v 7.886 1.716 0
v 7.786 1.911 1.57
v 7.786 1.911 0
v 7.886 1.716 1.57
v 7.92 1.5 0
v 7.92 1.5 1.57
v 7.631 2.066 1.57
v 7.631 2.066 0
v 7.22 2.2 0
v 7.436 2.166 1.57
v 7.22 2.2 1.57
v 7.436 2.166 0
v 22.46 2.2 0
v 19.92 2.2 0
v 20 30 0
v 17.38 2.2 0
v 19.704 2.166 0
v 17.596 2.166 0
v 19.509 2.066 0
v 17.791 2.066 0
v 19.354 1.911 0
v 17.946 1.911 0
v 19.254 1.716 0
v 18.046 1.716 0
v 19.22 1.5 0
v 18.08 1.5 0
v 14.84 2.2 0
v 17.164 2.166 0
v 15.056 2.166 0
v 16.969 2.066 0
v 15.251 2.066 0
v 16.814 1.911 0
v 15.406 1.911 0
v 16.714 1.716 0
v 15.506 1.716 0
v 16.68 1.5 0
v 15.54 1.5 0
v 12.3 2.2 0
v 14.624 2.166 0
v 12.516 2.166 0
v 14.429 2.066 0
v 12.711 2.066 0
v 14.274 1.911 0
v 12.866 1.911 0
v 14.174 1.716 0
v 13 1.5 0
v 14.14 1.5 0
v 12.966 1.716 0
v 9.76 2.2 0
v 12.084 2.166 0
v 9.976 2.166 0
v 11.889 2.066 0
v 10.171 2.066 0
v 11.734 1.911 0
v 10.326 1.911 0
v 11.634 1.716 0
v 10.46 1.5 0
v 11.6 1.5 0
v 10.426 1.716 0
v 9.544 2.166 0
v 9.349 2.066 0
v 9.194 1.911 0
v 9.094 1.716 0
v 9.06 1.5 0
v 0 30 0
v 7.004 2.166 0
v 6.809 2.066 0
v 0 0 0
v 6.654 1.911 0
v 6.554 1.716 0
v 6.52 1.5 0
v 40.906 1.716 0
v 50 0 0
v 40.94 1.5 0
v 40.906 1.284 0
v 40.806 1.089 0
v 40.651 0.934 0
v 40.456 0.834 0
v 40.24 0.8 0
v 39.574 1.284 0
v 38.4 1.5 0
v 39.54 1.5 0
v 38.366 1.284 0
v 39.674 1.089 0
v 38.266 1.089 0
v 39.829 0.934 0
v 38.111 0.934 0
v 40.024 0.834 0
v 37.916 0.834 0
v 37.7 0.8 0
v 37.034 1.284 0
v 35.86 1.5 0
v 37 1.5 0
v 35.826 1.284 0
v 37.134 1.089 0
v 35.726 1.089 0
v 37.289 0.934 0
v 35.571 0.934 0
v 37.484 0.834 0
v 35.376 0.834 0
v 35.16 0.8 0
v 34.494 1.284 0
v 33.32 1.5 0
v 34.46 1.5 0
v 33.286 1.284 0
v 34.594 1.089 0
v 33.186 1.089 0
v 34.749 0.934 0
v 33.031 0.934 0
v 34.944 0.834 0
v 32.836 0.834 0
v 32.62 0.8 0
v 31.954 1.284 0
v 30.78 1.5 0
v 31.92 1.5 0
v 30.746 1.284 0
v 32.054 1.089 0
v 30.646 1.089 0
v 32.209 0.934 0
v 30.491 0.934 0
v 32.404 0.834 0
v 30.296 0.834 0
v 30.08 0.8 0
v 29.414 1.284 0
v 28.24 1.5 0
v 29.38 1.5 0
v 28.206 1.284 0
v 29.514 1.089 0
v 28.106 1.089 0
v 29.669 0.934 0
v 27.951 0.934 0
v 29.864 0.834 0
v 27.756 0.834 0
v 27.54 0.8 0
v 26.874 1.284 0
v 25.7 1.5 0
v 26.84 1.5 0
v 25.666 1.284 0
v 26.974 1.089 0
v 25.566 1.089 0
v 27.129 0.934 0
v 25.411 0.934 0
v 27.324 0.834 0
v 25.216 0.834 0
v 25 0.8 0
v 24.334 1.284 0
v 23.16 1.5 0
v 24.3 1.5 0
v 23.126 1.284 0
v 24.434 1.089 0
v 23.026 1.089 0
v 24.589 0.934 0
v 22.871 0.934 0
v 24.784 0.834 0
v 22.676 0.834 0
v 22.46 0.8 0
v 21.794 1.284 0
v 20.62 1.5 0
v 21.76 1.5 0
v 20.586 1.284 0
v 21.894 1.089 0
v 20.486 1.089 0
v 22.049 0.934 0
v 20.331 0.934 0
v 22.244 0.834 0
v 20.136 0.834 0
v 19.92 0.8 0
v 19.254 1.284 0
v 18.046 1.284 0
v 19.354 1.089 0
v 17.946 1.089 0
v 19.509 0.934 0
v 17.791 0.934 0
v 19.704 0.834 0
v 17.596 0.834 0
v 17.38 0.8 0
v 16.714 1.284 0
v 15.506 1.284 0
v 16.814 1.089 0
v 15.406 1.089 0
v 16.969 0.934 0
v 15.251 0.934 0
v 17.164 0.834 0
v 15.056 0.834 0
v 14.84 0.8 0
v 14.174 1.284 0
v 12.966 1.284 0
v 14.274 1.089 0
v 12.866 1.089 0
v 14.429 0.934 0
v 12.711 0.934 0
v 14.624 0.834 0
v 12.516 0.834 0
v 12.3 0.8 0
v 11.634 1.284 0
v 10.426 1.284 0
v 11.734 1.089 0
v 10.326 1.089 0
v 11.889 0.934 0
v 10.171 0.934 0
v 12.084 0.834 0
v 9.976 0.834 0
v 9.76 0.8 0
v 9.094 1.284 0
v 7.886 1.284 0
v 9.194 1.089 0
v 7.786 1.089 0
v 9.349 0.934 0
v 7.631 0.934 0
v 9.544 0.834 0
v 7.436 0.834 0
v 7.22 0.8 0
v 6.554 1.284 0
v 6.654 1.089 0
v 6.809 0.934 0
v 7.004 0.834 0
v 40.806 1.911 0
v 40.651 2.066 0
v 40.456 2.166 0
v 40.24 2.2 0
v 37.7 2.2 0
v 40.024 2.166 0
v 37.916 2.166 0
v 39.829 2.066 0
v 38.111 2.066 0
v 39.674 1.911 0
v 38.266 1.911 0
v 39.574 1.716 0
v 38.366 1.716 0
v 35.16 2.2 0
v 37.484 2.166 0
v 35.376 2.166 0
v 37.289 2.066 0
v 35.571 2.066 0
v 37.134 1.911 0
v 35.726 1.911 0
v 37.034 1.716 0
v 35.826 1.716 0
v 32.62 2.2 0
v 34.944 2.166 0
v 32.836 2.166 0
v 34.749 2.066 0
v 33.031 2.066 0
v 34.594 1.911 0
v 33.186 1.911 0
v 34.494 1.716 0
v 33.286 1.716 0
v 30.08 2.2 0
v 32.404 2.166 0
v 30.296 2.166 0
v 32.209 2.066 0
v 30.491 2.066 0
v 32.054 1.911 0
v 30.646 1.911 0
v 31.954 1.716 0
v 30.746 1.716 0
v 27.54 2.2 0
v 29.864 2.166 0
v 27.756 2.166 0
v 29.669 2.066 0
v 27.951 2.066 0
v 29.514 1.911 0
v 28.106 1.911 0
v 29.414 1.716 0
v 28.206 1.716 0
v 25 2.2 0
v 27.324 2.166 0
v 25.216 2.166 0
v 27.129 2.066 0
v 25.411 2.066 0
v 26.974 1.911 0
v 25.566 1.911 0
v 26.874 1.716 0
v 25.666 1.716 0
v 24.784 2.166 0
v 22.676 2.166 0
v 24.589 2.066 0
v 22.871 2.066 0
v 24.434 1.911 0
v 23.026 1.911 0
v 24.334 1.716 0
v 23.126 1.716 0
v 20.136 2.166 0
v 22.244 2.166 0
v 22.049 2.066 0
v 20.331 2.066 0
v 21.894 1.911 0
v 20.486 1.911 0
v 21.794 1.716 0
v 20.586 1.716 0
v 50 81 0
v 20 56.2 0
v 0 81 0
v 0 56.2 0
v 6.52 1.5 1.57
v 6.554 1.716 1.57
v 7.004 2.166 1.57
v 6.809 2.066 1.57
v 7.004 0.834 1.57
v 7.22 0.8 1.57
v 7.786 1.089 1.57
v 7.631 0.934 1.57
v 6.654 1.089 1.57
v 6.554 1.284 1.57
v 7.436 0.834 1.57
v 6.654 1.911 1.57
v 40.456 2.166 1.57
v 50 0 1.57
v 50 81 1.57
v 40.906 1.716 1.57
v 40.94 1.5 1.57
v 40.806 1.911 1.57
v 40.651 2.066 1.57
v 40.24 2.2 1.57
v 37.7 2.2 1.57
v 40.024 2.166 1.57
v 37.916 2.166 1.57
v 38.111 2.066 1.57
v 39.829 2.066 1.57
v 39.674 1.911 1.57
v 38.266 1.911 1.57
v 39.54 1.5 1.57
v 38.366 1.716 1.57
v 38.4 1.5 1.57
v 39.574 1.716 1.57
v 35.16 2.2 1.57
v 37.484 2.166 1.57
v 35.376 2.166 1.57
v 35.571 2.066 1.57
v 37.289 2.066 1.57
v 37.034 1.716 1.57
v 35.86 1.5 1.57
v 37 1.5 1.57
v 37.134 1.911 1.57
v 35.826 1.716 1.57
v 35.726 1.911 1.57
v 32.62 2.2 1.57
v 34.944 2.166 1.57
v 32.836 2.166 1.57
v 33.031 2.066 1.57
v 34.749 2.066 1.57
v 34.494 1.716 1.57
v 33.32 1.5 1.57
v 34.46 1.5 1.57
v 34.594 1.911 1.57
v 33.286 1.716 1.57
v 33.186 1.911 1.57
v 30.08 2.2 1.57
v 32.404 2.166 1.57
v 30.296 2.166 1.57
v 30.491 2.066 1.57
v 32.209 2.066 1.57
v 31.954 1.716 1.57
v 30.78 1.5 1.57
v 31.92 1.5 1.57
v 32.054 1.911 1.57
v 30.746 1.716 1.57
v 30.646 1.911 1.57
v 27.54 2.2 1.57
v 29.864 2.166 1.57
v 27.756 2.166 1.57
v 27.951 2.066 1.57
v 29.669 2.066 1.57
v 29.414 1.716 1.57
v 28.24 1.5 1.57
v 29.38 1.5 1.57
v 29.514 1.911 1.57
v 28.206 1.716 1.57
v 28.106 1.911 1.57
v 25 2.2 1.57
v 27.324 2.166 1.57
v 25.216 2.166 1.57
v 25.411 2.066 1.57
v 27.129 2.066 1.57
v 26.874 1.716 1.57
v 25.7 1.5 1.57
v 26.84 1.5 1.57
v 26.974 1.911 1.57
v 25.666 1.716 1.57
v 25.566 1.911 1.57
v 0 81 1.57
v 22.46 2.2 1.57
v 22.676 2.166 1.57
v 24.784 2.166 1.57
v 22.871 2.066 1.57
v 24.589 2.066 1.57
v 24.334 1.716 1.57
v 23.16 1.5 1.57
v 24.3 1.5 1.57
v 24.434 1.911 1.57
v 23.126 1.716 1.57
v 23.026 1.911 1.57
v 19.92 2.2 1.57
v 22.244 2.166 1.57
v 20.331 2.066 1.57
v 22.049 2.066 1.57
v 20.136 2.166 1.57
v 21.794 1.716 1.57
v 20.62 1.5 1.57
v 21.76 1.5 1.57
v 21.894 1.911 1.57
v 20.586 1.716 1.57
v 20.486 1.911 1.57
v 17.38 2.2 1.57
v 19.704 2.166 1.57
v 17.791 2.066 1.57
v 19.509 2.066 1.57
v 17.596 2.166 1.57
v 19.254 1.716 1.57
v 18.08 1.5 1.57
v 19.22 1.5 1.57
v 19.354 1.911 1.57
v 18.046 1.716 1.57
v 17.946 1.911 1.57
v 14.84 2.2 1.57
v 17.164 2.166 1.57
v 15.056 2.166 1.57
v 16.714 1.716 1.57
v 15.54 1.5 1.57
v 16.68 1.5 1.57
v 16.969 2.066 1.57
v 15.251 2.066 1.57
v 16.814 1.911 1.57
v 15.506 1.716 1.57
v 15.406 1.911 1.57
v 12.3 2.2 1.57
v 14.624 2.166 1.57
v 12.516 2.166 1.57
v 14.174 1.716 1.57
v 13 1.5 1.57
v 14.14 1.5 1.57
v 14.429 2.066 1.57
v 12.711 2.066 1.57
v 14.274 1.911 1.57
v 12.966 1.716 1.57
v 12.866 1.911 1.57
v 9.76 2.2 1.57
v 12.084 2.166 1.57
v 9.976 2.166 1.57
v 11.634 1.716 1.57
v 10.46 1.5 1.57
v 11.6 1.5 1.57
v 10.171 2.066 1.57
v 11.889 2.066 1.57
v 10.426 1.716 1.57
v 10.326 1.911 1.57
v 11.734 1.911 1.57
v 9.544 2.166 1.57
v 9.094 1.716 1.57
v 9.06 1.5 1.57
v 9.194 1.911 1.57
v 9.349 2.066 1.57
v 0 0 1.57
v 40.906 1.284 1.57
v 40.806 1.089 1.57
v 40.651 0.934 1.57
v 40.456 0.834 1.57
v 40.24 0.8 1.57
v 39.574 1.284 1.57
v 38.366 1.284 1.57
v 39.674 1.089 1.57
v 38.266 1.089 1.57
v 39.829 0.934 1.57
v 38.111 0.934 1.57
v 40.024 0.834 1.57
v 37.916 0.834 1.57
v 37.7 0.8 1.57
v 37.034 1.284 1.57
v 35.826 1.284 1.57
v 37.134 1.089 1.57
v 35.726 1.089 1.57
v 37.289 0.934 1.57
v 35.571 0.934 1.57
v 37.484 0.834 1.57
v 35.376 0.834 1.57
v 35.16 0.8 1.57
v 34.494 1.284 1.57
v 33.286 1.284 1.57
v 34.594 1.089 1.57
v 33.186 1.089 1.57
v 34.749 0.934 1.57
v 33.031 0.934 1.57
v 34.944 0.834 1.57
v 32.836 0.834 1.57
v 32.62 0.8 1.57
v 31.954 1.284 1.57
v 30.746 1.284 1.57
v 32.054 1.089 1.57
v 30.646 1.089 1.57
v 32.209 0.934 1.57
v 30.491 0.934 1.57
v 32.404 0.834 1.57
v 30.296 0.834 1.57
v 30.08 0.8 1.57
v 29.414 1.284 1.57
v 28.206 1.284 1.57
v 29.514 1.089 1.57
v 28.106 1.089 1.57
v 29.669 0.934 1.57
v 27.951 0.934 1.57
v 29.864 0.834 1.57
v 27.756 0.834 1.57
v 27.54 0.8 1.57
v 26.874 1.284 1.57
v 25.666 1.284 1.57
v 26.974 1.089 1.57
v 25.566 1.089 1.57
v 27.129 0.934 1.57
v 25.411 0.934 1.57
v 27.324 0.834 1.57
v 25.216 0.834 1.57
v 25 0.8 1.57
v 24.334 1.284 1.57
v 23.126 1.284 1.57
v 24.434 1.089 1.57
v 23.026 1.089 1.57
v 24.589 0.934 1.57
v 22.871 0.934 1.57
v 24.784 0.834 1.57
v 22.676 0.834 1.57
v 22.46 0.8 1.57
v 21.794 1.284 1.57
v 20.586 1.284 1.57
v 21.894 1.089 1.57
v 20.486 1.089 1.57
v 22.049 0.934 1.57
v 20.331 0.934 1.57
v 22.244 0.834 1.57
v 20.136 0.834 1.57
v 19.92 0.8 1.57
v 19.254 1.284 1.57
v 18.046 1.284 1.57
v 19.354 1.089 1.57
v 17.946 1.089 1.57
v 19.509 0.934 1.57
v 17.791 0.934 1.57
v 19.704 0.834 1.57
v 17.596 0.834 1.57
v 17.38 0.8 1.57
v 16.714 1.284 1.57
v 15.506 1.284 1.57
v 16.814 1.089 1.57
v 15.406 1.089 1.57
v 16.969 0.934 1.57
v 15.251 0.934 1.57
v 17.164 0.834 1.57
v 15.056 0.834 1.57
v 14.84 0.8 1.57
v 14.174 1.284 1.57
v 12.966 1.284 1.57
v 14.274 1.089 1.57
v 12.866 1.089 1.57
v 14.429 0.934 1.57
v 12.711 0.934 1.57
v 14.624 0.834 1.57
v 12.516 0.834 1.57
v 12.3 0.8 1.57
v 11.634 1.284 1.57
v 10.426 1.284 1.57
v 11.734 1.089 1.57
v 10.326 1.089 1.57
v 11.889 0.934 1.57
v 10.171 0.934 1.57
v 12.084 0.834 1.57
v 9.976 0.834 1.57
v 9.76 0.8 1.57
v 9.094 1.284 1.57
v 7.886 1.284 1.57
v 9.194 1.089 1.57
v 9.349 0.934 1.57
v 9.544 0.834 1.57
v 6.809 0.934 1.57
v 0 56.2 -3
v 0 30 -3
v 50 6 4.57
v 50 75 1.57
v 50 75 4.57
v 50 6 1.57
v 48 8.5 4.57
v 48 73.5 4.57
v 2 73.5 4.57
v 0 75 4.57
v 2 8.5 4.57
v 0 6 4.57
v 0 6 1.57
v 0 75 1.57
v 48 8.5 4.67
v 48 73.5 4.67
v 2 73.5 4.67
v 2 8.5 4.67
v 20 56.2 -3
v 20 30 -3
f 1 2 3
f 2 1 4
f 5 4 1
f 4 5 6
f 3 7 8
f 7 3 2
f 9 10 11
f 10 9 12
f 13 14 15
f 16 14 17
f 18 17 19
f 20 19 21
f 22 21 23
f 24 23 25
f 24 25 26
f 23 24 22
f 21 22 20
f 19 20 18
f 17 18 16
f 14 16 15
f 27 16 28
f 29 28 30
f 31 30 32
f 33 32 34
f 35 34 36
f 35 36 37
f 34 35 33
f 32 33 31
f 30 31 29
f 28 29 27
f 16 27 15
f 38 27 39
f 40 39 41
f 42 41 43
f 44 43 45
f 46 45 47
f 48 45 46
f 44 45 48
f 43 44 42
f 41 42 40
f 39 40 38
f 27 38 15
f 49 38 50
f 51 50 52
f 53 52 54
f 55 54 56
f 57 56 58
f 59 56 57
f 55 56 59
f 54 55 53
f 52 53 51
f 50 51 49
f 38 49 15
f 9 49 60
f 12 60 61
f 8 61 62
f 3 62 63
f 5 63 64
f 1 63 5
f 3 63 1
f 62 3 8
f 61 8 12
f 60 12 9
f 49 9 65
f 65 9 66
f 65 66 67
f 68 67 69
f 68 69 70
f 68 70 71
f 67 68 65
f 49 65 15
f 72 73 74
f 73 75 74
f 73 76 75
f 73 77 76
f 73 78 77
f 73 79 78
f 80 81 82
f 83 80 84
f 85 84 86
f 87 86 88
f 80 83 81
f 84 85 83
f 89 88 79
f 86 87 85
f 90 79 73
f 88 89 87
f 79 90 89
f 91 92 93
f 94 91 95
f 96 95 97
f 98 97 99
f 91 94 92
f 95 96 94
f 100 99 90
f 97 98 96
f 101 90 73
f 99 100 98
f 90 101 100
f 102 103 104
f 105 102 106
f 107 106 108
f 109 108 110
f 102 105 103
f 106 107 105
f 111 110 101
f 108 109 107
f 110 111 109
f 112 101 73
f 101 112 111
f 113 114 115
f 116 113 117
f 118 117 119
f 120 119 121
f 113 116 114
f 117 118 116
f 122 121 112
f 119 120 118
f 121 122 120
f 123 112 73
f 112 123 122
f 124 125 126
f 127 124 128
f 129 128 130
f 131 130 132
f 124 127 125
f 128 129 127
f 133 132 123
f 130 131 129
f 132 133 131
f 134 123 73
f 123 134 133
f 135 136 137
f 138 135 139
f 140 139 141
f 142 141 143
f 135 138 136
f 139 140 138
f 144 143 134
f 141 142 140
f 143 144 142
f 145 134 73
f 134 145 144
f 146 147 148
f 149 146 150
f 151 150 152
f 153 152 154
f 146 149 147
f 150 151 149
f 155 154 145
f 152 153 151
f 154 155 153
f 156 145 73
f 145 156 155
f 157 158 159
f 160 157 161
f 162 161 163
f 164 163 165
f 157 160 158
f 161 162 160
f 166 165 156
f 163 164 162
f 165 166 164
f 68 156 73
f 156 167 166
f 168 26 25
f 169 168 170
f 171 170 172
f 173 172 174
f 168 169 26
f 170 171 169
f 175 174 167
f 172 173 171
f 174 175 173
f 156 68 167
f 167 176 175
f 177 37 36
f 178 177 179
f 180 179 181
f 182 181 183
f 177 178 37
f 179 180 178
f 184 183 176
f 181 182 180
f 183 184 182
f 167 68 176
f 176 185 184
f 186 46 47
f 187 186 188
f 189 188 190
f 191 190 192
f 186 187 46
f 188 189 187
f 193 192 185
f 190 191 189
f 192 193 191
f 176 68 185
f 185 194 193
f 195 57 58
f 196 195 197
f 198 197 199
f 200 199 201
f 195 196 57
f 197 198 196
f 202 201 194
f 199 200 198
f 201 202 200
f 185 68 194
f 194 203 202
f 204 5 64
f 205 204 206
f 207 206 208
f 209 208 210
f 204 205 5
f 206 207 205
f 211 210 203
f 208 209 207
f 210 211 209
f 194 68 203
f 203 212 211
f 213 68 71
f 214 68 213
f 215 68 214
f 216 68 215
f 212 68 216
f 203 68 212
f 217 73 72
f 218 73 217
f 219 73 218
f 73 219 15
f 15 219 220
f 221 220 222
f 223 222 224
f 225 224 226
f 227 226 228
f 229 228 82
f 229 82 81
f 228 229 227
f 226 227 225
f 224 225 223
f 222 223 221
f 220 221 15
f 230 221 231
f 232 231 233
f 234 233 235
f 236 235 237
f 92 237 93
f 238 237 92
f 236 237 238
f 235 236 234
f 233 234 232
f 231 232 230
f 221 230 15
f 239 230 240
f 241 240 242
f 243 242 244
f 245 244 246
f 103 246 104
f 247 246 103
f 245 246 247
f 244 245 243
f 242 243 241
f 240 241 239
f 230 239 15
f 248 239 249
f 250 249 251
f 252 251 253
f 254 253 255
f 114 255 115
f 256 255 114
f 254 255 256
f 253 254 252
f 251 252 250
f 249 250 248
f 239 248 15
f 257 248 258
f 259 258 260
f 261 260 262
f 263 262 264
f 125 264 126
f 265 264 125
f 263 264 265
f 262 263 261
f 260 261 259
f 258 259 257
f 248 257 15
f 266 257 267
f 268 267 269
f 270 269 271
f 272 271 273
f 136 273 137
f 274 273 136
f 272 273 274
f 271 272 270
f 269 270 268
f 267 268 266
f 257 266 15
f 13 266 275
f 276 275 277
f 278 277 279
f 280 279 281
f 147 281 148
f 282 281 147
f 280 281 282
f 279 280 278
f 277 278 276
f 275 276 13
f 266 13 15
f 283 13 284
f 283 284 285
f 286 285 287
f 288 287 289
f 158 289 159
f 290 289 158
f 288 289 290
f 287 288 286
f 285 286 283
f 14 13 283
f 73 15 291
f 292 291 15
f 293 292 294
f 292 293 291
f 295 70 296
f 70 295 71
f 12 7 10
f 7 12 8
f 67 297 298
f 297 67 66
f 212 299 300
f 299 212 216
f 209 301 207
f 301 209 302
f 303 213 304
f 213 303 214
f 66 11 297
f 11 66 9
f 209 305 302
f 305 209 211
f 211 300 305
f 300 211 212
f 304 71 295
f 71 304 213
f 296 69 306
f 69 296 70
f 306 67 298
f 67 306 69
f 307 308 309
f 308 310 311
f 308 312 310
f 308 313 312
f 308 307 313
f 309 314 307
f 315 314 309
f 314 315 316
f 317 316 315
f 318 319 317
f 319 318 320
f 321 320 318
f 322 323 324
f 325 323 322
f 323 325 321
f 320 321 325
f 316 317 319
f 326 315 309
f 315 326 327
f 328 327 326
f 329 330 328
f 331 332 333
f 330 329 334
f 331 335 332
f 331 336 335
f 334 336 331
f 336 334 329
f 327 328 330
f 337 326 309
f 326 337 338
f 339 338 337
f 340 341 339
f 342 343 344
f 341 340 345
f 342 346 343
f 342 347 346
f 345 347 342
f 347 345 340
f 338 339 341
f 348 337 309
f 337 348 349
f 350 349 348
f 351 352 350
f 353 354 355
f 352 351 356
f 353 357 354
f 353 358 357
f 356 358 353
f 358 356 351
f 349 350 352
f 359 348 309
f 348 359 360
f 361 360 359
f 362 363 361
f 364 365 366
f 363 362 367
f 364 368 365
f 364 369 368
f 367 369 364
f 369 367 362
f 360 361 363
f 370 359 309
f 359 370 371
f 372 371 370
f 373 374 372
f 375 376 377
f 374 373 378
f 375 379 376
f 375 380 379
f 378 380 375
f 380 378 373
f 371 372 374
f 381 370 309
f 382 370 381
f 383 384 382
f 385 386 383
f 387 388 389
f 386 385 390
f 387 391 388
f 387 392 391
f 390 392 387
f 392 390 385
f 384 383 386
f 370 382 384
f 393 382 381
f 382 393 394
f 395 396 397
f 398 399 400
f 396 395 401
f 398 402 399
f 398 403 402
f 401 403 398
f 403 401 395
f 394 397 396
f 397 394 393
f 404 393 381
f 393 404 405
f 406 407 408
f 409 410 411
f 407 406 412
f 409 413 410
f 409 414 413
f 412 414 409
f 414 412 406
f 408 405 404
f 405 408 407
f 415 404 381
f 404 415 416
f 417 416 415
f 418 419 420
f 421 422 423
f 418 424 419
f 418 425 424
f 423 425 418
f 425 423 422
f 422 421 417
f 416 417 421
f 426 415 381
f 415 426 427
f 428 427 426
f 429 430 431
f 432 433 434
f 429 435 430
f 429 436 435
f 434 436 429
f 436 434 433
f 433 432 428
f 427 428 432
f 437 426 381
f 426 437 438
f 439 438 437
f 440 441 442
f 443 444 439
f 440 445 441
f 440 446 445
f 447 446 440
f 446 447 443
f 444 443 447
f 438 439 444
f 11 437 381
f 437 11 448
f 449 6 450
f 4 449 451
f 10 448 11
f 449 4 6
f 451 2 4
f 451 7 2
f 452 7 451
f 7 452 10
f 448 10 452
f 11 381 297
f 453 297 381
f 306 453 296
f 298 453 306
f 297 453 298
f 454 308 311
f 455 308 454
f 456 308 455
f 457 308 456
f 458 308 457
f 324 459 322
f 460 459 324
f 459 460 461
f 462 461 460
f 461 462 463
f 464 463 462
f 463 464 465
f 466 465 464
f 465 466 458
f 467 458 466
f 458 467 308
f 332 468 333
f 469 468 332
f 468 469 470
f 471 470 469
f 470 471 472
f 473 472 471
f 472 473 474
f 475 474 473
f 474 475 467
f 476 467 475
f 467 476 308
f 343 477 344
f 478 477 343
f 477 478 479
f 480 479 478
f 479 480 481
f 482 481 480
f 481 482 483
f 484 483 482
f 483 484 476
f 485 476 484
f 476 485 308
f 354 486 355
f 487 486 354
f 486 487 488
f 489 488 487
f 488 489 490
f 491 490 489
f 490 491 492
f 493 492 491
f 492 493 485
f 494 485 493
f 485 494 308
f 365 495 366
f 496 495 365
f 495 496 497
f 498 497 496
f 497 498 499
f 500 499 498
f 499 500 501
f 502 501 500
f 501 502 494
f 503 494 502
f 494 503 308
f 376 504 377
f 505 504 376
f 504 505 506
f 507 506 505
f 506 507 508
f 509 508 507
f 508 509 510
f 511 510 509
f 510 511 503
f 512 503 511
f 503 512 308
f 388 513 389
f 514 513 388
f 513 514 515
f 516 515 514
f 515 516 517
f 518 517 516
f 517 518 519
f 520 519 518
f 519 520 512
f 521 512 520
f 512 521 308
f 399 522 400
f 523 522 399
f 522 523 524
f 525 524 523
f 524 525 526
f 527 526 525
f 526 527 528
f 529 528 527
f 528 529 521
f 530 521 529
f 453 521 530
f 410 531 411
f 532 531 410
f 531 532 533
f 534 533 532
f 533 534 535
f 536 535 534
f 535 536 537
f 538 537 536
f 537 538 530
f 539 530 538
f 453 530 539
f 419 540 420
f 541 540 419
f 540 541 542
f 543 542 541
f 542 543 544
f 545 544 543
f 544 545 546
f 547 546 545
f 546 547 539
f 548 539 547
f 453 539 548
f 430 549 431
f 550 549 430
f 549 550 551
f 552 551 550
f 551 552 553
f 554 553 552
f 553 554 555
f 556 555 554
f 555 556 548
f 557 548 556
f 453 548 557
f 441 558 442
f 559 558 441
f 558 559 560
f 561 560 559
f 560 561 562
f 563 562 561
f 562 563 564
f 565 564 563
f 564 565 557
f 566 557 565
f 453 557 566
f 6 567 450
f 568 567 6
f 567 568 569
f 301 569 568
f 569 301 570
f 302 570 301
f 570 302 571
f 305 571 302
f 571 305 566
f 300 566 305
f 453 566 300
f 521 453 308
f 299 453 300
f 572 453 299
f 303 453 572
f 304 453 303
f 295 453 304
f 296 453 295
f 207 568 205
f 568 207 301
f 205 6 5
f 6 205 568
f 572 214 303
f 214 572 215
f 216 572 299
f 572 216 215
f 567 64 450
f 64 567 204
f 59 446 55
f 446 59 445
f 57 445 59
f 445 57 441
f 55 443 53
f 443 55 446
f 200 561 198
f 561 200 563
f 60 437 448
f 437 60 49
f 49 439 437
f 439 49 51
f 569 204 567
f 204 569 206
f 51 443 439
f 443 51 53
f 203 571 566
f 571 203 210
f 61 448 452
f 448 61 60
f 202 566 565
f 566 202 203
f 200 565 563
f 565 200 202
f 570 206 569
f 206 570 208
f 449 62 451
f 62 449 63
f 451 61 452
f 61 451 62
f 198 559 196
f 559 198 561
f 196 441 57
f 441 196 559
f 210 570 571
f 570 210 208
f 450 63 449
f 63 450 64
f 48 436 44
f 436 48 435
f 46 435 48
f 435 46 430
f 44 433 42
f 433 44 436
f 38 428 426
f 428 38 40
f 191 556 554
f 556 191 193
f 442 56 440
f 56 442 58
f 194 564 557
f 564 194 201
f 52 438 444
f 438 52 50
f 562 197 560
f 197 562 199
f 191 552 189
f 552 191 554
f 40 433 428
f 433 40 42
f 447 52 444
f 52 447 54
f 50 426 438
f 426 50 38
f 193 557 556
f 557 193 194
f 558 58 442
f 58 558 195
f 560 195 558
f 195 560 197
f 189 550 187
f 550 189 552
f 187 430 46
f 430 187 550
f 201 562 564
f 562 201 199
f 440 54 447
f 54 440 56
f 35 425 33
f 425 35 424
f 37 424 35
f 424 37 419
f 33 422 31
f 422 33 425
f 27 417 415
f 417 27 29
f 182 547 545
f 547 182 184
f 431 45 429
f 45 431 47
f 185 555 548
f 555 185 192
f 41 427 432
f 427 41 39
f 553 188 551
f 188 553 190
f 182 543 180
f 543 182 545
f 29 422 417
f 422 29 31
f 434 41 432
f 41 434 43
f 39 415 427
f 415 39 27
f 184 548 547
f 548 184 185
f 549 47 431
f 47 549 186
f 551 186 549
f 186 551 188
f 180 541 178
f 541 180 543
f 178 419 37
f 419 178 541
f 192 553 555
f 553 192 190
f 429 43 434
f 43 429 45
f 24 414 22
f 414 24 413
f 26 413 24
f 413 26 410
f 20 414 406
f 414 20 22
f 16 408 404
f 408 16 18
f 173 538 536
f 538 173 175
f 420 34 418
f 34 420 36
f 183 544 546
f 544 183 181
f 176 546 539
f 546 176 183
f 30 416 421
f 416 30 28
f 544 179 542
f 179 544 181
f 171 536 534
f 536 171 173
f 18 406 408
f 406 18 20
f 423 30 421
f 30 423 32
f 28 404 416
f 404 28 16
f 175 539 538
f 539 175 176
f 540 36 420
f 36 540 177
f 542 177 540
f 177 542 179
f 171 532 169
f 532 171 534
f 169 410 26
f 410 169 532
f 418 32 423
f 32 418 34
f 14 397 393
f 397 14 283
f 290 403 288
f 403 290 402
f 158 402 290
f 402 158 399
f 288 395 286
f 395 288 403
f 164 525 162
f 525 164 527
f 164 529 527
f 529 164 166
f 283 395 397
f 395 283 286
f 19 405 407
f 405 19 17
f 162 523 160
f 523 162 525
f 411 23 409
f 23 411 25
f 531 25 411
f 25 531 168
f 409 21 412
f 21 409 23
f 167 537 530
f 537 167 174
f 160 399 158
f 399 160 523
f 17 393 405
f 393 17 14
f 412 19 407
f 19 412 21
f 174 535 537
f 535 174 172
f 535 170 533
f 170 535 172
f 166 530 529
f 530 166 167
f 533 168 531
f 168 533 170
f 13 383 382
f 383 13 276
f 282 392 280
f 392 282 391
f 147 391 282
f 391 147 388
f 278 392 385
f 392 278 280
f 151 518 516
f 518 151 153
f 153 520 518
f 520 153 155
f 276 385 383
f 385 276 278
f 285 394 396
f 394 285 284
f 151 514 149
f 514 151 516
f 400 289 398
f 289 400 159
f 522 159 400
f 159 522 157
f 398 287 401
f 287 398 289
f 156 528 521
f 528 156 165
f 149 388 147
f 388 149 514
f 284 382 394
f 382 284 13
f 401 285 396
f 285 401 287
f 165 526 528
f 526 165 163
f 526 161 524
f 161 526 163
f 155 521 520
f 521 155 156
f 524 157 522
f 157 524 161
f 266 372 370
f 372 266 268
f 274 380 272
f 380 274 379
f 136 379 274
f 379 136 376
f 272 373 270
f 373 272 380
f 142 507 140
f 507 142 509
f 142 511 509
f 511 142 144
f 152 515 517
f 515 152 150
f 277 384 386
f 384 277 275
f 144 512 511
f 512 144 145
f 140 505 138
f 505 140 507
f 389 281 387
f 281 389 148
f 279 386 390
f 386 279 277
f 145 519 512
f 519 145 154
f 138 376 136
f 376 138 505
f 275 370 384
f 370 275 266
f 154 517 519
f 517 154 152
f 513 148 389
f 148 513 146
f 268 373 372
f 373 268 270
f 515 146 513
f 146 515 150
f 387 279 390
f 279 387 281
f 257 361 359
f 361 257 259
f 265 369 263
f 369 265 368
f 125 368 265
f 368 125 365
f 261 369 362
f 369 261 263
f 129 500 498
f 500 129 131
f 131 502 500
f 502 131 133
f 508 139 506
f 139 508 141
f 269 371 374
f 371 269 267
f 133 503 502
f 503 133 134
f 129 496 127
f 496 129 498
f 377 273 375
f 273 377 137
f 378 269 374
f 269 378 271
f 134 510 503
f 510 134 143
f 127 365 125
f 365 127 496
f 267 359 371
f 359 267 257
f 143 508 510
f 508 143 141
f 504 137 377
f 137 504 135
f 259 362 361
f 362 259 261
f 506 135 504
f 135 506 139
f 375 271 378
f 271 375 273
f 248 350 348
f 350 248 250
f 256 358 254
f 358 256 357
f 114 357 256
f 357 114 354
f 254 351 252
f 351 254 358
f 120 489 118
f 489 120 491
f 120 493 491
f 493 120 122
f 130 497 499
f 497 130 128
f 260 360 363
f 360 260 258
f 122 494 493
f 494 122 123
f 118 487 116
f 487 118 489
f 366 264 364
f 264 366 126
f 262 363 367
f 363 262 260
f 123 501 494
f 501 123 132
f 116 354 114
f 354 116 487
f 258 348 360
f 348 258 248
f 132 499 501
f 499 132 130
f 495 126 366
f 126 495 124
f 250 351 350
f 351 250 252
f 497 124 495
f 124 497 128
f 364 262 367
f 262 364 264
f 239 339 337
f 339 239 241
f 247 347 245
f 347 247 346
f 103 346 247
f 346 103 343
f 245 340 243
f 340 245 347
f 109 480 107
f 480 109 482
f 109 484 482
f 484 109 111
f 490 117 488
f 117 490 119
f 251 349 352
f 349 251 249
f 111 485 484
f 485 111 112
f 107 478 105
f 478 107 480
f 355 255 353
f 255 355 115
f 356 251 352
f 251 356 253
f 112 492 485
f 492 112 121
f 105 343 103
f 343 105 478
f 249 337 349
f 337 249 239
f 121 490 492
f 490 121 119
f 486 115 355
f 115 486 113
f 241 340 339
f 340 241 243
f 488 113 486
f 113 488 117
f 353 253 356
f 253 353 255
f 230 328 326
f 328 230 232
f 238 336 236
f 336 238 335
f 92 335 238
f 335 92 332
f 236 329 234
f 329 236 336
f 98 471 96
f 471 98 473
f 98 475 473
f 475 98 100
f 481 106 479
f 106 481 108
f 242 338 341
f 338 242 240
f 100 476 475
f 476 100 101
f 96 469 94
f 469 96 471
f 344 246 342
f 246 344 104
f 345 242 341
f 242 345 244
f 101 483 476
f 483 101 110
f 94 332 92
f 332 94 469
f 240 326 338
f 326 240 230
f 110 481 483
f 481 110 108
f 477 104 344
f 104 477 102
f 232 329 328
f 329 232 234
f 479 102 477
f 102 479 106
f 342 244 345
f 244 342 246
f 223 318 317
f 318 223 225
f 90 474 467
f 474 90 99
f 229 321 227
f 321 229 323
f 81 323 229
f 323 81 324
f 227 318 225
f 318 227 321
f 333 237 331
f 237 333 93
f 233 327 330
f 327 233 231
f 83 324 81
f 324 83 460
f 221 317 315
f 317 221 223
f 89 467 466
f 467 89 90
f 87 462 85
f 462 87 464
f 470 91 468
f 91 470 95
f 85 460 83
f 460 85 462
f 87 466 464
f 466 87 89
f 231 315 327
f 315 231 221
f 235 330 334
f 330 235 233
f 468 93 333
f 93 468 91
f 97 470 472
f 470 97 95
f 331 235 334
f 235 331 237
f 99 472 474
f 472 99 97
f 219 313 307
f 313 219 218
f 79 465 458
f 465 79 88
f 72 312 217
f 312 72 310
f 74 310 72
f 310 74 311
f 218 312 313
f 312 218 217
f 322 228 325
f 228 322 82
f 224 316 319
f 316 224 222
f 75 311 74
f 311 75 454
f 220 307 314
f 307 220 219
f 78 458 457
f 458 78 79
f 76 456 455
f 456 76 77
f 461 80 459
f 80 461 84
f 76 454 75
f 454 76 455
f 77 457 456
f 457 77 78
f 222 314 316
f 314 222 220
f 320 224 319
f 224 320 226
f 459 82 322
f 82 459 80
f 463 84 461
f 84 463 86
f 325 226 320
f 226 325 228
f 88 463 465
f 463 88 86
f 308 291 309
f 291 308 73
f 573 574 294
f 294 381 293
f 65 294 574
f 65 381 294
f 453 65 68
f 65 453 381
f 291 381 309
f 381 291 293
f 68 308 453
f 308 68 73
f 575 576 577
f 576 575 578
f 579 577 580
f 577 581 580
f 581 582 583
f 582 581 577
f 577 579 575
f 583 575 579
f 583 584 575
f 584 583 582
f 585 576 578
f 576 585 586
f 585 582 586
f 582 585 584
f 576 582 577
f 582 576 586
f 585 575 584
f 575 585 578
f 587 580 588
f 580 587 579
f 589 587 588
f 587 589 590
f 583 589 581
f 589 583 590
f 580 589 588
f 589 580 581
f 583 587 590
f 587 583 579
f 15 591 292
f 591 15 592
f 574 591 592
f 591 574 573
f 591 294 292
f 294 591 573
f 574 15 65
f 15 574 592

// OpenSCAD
display_board_width = 50;
display_board_height = 81;
display_board_depth = 1.57;

pin_spacing = 2.54;
pin_radius = 0.7; // TODO: estimate

display_board_main_pins_offset_y = 1.5; // roughly
display_board_main_pins_count = 14;

display_panel_border_height = 69; // nice
display_panel_border_offset_y = 6;
display_panel_border_depth = 3; // TODO: eyeballed

display_panel_width = 46;
display_panel_height = 65;
display_panel_offset_y = 2.5;

sd_slot_height = 26.2;
sd_slot_offset_y = 30;
sd_slot_width = 20; // TODO: eyeballed
sd_slot_depth = 3; // TODO: eyeballed

union() {
    
// Display board
difference() {
    color("red")
    cube([display_board_width, display_board_height, display_board_depth]);
    
    translate([
        (display_board_width - display_board_main_pins_count * pin_spacing) / 2,
        display_board_main_pins_offset_y,
        0
    ])
    for (i = [ 0 : display_board_main_pins_count - 1 ]) {
        translate([i * pin_spacing, 0, 0])
        cylinder(display_board_depth, r=pin_radius, $fn=20);
    }
}

// Display panel and border
translate([0, display_panel_border_offset_y, display_board_depth]) {
    // Border
    color("white")
    cube([display_board_width, display_panel_border_height, display_panel_border_depth]);

    // Panel
    color("black")
    translate([(display_board_width - display_panel_width) / 2, display_panel_offset_y, display_panel_border_depth])
    cube([display_panel_width, display_panel_height, 0.1]);
}

// SD slot
color("grey")
translate([0, sd_slot_offset_y, -sd_slot_depth])
cube([sd_slot_width, sd_slot_height, sd_slot_depth]);

}
